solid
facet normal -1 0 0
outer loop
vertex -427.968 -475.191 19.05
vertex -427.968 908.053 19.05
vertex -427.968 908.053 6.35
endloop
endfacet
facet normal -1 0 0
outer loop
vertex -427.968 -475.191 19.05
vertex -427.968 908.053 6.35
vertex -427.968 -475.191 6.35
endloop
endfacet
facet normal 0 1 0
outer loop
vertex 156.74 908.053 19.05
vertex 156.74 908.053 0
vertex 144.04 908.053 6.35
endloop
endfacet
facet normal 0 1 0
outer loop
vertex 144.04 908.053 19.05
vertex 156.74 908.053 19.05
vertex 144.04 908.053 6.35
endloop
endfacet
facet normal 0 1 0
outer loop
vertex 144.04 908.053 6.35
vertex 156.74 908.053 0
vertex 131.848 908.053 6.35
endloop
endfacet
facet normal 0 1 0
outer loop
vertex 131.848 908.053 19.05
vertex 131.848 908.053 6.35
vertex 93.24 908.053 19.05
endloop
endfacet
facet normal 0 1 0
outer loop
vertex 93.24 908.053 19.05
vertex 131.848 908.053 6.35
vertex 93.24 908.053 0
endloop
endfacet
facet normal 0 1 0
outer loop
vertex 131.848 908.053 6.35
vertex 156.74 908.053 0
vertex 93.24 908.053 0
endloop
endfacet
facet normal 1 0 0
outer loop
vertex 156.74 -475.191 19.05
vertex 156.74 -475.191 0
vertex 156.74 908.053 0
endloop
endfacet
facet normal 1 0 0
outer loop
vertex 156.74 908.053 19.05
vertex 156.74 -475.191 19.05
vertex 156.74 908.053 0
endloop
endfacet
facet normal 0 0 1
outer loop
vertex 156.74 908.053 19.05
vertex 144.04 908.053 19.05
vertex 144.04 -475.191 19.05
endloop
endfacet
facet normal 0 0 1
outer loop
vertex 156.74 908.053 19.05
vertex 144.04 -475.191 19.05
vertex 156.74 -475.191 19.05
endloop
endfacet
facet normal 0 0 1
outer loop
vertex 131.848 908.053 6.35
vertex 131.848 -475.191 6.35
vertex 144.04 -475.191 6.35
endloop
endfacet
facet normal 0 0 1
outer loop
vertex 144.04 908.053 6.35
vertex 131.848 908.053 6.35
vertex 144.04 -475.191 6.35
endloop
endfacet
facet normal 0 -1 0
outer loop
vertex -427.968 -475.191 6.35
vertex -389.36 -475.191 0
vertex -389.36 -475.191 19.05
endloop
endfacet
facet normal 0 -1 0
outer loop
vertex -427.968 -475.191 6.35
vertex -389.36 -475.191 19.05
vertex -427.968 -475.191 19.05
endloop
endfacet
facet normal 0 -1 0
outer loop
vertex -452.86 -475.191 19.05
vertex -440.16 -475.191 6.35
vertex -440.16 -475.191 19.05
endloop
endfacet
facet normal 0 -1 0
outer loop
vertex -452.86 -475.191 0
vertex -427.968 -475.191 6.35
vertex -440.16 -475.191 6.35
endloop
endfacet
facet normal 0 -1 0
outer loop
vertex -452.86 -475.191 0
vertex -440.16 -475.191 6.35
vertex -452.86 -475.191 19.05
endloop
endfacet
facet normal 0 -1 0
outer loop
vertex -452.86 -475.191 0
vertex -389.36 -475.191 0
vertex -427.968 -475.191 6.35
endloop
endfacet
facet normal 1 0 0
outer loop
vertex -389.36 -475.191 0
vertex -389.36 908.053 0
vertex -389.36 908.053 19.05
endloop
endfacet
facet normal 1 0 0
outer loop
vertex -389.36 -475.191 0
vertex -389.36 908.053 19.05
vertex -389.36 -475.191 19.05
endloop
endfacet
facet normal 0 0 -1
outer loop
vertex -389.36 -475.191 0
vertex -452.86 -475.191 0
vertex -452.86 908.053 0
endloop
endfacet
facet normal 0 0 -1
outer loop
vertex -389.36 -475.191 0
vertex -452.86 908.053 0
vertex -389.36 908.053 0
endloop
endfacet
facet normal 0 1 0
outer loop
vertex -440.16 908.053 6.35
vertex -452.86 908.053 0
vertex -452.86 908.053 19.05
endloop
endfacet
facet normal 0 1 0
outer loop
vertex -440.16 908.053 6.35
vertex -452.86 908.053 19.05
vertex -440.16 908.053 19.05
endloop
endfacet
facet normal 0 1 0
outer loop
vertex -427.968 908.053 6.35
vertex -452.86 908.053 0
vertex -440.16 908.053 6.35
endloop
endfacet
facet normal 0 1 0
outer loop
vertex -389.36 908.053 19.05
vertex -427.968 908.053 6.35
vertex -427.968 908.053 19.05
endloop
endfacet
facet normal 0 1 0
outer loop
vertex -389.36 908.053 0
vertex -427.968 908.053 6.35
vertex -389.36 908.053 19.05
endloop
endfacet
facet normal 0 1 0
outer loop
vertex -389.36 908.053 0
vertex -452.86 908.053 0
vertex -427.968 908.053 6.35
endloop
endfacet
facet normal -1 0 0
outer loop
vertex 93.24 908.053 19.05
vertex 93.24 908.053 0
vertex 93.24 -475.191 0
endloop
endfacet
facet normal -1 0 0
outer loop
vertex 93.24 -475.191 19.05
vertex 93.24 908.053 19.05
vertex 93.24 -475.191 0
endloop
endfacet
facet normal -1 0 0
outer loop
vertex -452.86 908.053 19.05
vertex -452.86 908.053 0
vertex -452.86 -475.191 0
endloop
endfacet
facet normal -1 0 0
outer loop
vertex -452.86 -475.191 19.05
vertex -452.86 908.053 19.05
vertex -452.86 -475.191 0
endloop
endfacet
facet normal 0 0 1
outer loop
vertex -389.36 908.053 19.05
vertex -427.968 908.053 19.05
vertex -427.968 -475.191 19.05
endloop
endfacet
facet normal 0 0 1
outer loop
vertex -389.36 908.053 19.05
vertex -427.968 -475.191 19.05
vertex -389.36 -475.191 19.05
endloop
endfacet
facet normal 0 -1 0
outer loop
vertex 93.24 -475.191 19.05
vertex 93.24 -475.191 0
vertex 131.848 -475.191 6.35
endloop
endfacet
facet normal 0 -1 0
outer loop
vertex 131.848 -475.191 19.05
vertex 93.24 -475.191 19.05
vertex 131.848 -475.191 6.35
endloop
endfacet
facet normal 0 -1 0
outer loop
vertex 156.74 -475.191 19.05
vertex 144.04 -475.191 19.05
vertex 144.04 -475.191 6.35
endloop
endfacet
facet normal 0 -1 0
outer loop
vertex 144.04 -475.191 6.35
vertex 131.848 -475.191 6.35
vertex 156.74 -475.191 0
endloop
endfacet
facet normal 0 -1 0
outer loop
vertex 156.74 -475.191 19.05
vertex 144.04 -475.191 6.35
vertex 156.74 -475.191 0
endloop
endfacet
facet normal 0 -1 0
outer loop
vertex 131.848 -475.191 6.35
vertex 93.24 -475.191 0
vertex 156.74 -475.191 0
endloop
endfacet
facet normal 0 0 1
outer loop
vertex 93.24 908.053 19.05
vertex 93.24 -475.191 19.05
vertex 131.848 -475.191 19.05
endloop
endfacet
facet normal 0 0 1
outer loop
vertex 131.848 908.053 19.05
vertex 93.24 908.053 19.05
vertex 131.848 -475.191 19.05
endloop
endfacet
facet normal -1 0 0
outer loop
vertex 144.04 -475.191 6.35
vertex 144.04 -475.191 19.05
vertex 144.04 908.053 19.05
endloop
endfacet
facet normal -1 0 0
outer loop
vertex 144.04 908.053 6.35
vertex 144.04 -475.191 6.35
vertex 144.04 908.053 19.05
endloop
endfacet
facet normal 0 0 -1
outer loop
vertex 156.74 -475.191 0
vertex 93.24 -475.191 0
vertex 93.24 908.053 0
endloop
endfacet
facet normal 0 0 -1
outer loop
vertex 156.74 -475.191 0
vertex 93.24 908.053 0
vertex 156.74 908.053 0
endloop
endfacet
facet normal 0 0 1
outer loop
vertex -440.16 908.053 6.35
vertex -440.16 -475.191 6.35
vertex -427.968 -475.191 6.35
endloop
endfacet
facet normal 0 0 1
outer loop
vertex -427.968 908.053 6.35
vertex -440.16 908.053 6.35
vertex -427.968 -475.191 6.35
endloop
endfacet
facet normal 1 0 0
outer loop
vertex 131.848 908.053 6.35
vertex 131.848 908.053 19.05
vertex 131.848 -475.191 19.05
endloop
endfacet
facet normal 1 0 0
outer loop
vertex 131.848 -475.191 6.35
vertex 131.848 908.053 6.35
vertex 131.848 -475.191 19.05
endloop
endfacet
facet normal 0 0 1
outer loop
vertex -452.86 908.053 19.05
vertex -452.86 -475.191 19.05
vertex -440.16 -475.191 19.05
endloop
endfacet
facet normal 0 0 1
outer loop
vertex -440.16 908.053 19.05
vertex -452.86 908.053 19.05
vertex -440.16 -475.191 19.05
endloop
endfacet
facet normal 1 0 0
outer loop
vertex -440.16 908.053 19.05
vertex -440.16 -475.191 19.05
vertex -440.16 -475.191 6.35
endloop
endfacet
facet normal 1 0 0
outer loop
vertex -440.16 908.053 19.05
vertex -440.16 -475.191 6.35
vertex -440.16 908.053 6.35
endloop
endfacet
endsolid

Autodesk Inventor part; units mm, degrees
ref_plane "YZ Plane" through (0, 0, 0) normal (1, 0, 0) x (0, 1, 0)
ref_plane "XZ Plane" through (0, 0, 0) normal (0, 1, 0) x (-1, 0, 0)
ref_plane "XY Plane" through (0, 0, 0) normal (0, 0, 1) x (1, 0, 0)
ref_plane "Work Plane1" through (0, 0, 0) normal (0, 0, 1) x (1, 0, 0)
sketch "Sketch1" plane through (0, 0, 0) normal (0, 0, 1) x (1, 0, 0)
  line L0 (-452.8602, 908.0528) -> (-452.8602, -475.1907) projected
  line L1 (156.7398, -475.1907) -> (156.7398, 908.0528) projected
  line L2 (-452.8602, 908.0528) -> (-389.3602, 908.0528)
  line L3 (-389.3602, 908.0528) -> (-389.3602, -475.1907)
  line L4 (-389.3602, -475.1907) -> (-452.8602, -475.1907)
  line L5 (-452.8602, -475.1907) -> (-452.8602, 908.0528)
  line L6 (156.7398, 908.0528) -> (93.2398, 908.0528)
  line L7 (93.2398, 908.0528) -> (93.2398, -475.1907)
  line L8 (93.2398, -475.1907) -> (156.7398, -475.1907)
  line L9 (156.7398, -475.1907) -> (156.7398, 908.0528)
  point P0 (0, 0)
  dimension "borderW" = 63.5
  dimension "d1" = 63.5
extrude "Extrusion1" add sketch "Sketch1" along normal blind 19.05
sketch "Sketch2" plane through (0, 0, 19.05) normal (0, 0, 1) x (1, 0, 0)
  line L0 (-452.8602, 908.0528) -> (-452.8602, -475.1907) projected
  line L1 (-452.8602, -475.1907) -> (-389.3602, -475.1907) projected
  line L2 (-389.3602, 908.0528) -> (-452.8602, 908.0528) projected
  line L3 (156.7398, 908.0528) -> (93.2398, 908.0528) projected
  line L4 (93.2398, 908.0528) -> (93.2398, -475.1907) projected
  line L5 (93.2398, -475.1907) -> (156.7398, -475.1907) projected
  line L6 (156.7398, -475.1907) -> (156.7398, 908.0528) projected
  line L7 (-440.1602, 908.0528) -> (-427.9682, 908.0528)
  line L8 (-427.9682, 908.0528) -> (-427.9682, -475.1907)
  line L9 (-427.9682, -475.1907) -> (-440.1602, -475.1907)
  line L10 (-440.1602, -475.1907) -> (-440.1602, 908.0528)
  line L11 (144.0398, 908.0528) -> (131.8478, 908.0528)
  line L12 (131.8478, 908.0528) -> (131.8478, -475.1907)
  line L13 (131.8478, -475.1907) -> (144.0398, -475.1907)
  line L14 (144.0398, -475.1907) -> (144.0398, 908.0528)
  point P0 (0, 0)
  dimension "bRopeChannel" = 12.192
  dimension "d5" = 12.192
  dimension "d6" = 12.7
  dimension "d7" = 12.7
extrude "Extrusion2" cut sketch "Sketch2" against normal blind 12.7 contours L2 L8 L1 L10 | L14 L5 L12 L3
equation "\"d1\" = borderW"
equation "\"d5\" = bRopeChannel"
equation "\"d7\" = d6"
properties part number "HOT SideBorder" material "Rubber, Butyl"
